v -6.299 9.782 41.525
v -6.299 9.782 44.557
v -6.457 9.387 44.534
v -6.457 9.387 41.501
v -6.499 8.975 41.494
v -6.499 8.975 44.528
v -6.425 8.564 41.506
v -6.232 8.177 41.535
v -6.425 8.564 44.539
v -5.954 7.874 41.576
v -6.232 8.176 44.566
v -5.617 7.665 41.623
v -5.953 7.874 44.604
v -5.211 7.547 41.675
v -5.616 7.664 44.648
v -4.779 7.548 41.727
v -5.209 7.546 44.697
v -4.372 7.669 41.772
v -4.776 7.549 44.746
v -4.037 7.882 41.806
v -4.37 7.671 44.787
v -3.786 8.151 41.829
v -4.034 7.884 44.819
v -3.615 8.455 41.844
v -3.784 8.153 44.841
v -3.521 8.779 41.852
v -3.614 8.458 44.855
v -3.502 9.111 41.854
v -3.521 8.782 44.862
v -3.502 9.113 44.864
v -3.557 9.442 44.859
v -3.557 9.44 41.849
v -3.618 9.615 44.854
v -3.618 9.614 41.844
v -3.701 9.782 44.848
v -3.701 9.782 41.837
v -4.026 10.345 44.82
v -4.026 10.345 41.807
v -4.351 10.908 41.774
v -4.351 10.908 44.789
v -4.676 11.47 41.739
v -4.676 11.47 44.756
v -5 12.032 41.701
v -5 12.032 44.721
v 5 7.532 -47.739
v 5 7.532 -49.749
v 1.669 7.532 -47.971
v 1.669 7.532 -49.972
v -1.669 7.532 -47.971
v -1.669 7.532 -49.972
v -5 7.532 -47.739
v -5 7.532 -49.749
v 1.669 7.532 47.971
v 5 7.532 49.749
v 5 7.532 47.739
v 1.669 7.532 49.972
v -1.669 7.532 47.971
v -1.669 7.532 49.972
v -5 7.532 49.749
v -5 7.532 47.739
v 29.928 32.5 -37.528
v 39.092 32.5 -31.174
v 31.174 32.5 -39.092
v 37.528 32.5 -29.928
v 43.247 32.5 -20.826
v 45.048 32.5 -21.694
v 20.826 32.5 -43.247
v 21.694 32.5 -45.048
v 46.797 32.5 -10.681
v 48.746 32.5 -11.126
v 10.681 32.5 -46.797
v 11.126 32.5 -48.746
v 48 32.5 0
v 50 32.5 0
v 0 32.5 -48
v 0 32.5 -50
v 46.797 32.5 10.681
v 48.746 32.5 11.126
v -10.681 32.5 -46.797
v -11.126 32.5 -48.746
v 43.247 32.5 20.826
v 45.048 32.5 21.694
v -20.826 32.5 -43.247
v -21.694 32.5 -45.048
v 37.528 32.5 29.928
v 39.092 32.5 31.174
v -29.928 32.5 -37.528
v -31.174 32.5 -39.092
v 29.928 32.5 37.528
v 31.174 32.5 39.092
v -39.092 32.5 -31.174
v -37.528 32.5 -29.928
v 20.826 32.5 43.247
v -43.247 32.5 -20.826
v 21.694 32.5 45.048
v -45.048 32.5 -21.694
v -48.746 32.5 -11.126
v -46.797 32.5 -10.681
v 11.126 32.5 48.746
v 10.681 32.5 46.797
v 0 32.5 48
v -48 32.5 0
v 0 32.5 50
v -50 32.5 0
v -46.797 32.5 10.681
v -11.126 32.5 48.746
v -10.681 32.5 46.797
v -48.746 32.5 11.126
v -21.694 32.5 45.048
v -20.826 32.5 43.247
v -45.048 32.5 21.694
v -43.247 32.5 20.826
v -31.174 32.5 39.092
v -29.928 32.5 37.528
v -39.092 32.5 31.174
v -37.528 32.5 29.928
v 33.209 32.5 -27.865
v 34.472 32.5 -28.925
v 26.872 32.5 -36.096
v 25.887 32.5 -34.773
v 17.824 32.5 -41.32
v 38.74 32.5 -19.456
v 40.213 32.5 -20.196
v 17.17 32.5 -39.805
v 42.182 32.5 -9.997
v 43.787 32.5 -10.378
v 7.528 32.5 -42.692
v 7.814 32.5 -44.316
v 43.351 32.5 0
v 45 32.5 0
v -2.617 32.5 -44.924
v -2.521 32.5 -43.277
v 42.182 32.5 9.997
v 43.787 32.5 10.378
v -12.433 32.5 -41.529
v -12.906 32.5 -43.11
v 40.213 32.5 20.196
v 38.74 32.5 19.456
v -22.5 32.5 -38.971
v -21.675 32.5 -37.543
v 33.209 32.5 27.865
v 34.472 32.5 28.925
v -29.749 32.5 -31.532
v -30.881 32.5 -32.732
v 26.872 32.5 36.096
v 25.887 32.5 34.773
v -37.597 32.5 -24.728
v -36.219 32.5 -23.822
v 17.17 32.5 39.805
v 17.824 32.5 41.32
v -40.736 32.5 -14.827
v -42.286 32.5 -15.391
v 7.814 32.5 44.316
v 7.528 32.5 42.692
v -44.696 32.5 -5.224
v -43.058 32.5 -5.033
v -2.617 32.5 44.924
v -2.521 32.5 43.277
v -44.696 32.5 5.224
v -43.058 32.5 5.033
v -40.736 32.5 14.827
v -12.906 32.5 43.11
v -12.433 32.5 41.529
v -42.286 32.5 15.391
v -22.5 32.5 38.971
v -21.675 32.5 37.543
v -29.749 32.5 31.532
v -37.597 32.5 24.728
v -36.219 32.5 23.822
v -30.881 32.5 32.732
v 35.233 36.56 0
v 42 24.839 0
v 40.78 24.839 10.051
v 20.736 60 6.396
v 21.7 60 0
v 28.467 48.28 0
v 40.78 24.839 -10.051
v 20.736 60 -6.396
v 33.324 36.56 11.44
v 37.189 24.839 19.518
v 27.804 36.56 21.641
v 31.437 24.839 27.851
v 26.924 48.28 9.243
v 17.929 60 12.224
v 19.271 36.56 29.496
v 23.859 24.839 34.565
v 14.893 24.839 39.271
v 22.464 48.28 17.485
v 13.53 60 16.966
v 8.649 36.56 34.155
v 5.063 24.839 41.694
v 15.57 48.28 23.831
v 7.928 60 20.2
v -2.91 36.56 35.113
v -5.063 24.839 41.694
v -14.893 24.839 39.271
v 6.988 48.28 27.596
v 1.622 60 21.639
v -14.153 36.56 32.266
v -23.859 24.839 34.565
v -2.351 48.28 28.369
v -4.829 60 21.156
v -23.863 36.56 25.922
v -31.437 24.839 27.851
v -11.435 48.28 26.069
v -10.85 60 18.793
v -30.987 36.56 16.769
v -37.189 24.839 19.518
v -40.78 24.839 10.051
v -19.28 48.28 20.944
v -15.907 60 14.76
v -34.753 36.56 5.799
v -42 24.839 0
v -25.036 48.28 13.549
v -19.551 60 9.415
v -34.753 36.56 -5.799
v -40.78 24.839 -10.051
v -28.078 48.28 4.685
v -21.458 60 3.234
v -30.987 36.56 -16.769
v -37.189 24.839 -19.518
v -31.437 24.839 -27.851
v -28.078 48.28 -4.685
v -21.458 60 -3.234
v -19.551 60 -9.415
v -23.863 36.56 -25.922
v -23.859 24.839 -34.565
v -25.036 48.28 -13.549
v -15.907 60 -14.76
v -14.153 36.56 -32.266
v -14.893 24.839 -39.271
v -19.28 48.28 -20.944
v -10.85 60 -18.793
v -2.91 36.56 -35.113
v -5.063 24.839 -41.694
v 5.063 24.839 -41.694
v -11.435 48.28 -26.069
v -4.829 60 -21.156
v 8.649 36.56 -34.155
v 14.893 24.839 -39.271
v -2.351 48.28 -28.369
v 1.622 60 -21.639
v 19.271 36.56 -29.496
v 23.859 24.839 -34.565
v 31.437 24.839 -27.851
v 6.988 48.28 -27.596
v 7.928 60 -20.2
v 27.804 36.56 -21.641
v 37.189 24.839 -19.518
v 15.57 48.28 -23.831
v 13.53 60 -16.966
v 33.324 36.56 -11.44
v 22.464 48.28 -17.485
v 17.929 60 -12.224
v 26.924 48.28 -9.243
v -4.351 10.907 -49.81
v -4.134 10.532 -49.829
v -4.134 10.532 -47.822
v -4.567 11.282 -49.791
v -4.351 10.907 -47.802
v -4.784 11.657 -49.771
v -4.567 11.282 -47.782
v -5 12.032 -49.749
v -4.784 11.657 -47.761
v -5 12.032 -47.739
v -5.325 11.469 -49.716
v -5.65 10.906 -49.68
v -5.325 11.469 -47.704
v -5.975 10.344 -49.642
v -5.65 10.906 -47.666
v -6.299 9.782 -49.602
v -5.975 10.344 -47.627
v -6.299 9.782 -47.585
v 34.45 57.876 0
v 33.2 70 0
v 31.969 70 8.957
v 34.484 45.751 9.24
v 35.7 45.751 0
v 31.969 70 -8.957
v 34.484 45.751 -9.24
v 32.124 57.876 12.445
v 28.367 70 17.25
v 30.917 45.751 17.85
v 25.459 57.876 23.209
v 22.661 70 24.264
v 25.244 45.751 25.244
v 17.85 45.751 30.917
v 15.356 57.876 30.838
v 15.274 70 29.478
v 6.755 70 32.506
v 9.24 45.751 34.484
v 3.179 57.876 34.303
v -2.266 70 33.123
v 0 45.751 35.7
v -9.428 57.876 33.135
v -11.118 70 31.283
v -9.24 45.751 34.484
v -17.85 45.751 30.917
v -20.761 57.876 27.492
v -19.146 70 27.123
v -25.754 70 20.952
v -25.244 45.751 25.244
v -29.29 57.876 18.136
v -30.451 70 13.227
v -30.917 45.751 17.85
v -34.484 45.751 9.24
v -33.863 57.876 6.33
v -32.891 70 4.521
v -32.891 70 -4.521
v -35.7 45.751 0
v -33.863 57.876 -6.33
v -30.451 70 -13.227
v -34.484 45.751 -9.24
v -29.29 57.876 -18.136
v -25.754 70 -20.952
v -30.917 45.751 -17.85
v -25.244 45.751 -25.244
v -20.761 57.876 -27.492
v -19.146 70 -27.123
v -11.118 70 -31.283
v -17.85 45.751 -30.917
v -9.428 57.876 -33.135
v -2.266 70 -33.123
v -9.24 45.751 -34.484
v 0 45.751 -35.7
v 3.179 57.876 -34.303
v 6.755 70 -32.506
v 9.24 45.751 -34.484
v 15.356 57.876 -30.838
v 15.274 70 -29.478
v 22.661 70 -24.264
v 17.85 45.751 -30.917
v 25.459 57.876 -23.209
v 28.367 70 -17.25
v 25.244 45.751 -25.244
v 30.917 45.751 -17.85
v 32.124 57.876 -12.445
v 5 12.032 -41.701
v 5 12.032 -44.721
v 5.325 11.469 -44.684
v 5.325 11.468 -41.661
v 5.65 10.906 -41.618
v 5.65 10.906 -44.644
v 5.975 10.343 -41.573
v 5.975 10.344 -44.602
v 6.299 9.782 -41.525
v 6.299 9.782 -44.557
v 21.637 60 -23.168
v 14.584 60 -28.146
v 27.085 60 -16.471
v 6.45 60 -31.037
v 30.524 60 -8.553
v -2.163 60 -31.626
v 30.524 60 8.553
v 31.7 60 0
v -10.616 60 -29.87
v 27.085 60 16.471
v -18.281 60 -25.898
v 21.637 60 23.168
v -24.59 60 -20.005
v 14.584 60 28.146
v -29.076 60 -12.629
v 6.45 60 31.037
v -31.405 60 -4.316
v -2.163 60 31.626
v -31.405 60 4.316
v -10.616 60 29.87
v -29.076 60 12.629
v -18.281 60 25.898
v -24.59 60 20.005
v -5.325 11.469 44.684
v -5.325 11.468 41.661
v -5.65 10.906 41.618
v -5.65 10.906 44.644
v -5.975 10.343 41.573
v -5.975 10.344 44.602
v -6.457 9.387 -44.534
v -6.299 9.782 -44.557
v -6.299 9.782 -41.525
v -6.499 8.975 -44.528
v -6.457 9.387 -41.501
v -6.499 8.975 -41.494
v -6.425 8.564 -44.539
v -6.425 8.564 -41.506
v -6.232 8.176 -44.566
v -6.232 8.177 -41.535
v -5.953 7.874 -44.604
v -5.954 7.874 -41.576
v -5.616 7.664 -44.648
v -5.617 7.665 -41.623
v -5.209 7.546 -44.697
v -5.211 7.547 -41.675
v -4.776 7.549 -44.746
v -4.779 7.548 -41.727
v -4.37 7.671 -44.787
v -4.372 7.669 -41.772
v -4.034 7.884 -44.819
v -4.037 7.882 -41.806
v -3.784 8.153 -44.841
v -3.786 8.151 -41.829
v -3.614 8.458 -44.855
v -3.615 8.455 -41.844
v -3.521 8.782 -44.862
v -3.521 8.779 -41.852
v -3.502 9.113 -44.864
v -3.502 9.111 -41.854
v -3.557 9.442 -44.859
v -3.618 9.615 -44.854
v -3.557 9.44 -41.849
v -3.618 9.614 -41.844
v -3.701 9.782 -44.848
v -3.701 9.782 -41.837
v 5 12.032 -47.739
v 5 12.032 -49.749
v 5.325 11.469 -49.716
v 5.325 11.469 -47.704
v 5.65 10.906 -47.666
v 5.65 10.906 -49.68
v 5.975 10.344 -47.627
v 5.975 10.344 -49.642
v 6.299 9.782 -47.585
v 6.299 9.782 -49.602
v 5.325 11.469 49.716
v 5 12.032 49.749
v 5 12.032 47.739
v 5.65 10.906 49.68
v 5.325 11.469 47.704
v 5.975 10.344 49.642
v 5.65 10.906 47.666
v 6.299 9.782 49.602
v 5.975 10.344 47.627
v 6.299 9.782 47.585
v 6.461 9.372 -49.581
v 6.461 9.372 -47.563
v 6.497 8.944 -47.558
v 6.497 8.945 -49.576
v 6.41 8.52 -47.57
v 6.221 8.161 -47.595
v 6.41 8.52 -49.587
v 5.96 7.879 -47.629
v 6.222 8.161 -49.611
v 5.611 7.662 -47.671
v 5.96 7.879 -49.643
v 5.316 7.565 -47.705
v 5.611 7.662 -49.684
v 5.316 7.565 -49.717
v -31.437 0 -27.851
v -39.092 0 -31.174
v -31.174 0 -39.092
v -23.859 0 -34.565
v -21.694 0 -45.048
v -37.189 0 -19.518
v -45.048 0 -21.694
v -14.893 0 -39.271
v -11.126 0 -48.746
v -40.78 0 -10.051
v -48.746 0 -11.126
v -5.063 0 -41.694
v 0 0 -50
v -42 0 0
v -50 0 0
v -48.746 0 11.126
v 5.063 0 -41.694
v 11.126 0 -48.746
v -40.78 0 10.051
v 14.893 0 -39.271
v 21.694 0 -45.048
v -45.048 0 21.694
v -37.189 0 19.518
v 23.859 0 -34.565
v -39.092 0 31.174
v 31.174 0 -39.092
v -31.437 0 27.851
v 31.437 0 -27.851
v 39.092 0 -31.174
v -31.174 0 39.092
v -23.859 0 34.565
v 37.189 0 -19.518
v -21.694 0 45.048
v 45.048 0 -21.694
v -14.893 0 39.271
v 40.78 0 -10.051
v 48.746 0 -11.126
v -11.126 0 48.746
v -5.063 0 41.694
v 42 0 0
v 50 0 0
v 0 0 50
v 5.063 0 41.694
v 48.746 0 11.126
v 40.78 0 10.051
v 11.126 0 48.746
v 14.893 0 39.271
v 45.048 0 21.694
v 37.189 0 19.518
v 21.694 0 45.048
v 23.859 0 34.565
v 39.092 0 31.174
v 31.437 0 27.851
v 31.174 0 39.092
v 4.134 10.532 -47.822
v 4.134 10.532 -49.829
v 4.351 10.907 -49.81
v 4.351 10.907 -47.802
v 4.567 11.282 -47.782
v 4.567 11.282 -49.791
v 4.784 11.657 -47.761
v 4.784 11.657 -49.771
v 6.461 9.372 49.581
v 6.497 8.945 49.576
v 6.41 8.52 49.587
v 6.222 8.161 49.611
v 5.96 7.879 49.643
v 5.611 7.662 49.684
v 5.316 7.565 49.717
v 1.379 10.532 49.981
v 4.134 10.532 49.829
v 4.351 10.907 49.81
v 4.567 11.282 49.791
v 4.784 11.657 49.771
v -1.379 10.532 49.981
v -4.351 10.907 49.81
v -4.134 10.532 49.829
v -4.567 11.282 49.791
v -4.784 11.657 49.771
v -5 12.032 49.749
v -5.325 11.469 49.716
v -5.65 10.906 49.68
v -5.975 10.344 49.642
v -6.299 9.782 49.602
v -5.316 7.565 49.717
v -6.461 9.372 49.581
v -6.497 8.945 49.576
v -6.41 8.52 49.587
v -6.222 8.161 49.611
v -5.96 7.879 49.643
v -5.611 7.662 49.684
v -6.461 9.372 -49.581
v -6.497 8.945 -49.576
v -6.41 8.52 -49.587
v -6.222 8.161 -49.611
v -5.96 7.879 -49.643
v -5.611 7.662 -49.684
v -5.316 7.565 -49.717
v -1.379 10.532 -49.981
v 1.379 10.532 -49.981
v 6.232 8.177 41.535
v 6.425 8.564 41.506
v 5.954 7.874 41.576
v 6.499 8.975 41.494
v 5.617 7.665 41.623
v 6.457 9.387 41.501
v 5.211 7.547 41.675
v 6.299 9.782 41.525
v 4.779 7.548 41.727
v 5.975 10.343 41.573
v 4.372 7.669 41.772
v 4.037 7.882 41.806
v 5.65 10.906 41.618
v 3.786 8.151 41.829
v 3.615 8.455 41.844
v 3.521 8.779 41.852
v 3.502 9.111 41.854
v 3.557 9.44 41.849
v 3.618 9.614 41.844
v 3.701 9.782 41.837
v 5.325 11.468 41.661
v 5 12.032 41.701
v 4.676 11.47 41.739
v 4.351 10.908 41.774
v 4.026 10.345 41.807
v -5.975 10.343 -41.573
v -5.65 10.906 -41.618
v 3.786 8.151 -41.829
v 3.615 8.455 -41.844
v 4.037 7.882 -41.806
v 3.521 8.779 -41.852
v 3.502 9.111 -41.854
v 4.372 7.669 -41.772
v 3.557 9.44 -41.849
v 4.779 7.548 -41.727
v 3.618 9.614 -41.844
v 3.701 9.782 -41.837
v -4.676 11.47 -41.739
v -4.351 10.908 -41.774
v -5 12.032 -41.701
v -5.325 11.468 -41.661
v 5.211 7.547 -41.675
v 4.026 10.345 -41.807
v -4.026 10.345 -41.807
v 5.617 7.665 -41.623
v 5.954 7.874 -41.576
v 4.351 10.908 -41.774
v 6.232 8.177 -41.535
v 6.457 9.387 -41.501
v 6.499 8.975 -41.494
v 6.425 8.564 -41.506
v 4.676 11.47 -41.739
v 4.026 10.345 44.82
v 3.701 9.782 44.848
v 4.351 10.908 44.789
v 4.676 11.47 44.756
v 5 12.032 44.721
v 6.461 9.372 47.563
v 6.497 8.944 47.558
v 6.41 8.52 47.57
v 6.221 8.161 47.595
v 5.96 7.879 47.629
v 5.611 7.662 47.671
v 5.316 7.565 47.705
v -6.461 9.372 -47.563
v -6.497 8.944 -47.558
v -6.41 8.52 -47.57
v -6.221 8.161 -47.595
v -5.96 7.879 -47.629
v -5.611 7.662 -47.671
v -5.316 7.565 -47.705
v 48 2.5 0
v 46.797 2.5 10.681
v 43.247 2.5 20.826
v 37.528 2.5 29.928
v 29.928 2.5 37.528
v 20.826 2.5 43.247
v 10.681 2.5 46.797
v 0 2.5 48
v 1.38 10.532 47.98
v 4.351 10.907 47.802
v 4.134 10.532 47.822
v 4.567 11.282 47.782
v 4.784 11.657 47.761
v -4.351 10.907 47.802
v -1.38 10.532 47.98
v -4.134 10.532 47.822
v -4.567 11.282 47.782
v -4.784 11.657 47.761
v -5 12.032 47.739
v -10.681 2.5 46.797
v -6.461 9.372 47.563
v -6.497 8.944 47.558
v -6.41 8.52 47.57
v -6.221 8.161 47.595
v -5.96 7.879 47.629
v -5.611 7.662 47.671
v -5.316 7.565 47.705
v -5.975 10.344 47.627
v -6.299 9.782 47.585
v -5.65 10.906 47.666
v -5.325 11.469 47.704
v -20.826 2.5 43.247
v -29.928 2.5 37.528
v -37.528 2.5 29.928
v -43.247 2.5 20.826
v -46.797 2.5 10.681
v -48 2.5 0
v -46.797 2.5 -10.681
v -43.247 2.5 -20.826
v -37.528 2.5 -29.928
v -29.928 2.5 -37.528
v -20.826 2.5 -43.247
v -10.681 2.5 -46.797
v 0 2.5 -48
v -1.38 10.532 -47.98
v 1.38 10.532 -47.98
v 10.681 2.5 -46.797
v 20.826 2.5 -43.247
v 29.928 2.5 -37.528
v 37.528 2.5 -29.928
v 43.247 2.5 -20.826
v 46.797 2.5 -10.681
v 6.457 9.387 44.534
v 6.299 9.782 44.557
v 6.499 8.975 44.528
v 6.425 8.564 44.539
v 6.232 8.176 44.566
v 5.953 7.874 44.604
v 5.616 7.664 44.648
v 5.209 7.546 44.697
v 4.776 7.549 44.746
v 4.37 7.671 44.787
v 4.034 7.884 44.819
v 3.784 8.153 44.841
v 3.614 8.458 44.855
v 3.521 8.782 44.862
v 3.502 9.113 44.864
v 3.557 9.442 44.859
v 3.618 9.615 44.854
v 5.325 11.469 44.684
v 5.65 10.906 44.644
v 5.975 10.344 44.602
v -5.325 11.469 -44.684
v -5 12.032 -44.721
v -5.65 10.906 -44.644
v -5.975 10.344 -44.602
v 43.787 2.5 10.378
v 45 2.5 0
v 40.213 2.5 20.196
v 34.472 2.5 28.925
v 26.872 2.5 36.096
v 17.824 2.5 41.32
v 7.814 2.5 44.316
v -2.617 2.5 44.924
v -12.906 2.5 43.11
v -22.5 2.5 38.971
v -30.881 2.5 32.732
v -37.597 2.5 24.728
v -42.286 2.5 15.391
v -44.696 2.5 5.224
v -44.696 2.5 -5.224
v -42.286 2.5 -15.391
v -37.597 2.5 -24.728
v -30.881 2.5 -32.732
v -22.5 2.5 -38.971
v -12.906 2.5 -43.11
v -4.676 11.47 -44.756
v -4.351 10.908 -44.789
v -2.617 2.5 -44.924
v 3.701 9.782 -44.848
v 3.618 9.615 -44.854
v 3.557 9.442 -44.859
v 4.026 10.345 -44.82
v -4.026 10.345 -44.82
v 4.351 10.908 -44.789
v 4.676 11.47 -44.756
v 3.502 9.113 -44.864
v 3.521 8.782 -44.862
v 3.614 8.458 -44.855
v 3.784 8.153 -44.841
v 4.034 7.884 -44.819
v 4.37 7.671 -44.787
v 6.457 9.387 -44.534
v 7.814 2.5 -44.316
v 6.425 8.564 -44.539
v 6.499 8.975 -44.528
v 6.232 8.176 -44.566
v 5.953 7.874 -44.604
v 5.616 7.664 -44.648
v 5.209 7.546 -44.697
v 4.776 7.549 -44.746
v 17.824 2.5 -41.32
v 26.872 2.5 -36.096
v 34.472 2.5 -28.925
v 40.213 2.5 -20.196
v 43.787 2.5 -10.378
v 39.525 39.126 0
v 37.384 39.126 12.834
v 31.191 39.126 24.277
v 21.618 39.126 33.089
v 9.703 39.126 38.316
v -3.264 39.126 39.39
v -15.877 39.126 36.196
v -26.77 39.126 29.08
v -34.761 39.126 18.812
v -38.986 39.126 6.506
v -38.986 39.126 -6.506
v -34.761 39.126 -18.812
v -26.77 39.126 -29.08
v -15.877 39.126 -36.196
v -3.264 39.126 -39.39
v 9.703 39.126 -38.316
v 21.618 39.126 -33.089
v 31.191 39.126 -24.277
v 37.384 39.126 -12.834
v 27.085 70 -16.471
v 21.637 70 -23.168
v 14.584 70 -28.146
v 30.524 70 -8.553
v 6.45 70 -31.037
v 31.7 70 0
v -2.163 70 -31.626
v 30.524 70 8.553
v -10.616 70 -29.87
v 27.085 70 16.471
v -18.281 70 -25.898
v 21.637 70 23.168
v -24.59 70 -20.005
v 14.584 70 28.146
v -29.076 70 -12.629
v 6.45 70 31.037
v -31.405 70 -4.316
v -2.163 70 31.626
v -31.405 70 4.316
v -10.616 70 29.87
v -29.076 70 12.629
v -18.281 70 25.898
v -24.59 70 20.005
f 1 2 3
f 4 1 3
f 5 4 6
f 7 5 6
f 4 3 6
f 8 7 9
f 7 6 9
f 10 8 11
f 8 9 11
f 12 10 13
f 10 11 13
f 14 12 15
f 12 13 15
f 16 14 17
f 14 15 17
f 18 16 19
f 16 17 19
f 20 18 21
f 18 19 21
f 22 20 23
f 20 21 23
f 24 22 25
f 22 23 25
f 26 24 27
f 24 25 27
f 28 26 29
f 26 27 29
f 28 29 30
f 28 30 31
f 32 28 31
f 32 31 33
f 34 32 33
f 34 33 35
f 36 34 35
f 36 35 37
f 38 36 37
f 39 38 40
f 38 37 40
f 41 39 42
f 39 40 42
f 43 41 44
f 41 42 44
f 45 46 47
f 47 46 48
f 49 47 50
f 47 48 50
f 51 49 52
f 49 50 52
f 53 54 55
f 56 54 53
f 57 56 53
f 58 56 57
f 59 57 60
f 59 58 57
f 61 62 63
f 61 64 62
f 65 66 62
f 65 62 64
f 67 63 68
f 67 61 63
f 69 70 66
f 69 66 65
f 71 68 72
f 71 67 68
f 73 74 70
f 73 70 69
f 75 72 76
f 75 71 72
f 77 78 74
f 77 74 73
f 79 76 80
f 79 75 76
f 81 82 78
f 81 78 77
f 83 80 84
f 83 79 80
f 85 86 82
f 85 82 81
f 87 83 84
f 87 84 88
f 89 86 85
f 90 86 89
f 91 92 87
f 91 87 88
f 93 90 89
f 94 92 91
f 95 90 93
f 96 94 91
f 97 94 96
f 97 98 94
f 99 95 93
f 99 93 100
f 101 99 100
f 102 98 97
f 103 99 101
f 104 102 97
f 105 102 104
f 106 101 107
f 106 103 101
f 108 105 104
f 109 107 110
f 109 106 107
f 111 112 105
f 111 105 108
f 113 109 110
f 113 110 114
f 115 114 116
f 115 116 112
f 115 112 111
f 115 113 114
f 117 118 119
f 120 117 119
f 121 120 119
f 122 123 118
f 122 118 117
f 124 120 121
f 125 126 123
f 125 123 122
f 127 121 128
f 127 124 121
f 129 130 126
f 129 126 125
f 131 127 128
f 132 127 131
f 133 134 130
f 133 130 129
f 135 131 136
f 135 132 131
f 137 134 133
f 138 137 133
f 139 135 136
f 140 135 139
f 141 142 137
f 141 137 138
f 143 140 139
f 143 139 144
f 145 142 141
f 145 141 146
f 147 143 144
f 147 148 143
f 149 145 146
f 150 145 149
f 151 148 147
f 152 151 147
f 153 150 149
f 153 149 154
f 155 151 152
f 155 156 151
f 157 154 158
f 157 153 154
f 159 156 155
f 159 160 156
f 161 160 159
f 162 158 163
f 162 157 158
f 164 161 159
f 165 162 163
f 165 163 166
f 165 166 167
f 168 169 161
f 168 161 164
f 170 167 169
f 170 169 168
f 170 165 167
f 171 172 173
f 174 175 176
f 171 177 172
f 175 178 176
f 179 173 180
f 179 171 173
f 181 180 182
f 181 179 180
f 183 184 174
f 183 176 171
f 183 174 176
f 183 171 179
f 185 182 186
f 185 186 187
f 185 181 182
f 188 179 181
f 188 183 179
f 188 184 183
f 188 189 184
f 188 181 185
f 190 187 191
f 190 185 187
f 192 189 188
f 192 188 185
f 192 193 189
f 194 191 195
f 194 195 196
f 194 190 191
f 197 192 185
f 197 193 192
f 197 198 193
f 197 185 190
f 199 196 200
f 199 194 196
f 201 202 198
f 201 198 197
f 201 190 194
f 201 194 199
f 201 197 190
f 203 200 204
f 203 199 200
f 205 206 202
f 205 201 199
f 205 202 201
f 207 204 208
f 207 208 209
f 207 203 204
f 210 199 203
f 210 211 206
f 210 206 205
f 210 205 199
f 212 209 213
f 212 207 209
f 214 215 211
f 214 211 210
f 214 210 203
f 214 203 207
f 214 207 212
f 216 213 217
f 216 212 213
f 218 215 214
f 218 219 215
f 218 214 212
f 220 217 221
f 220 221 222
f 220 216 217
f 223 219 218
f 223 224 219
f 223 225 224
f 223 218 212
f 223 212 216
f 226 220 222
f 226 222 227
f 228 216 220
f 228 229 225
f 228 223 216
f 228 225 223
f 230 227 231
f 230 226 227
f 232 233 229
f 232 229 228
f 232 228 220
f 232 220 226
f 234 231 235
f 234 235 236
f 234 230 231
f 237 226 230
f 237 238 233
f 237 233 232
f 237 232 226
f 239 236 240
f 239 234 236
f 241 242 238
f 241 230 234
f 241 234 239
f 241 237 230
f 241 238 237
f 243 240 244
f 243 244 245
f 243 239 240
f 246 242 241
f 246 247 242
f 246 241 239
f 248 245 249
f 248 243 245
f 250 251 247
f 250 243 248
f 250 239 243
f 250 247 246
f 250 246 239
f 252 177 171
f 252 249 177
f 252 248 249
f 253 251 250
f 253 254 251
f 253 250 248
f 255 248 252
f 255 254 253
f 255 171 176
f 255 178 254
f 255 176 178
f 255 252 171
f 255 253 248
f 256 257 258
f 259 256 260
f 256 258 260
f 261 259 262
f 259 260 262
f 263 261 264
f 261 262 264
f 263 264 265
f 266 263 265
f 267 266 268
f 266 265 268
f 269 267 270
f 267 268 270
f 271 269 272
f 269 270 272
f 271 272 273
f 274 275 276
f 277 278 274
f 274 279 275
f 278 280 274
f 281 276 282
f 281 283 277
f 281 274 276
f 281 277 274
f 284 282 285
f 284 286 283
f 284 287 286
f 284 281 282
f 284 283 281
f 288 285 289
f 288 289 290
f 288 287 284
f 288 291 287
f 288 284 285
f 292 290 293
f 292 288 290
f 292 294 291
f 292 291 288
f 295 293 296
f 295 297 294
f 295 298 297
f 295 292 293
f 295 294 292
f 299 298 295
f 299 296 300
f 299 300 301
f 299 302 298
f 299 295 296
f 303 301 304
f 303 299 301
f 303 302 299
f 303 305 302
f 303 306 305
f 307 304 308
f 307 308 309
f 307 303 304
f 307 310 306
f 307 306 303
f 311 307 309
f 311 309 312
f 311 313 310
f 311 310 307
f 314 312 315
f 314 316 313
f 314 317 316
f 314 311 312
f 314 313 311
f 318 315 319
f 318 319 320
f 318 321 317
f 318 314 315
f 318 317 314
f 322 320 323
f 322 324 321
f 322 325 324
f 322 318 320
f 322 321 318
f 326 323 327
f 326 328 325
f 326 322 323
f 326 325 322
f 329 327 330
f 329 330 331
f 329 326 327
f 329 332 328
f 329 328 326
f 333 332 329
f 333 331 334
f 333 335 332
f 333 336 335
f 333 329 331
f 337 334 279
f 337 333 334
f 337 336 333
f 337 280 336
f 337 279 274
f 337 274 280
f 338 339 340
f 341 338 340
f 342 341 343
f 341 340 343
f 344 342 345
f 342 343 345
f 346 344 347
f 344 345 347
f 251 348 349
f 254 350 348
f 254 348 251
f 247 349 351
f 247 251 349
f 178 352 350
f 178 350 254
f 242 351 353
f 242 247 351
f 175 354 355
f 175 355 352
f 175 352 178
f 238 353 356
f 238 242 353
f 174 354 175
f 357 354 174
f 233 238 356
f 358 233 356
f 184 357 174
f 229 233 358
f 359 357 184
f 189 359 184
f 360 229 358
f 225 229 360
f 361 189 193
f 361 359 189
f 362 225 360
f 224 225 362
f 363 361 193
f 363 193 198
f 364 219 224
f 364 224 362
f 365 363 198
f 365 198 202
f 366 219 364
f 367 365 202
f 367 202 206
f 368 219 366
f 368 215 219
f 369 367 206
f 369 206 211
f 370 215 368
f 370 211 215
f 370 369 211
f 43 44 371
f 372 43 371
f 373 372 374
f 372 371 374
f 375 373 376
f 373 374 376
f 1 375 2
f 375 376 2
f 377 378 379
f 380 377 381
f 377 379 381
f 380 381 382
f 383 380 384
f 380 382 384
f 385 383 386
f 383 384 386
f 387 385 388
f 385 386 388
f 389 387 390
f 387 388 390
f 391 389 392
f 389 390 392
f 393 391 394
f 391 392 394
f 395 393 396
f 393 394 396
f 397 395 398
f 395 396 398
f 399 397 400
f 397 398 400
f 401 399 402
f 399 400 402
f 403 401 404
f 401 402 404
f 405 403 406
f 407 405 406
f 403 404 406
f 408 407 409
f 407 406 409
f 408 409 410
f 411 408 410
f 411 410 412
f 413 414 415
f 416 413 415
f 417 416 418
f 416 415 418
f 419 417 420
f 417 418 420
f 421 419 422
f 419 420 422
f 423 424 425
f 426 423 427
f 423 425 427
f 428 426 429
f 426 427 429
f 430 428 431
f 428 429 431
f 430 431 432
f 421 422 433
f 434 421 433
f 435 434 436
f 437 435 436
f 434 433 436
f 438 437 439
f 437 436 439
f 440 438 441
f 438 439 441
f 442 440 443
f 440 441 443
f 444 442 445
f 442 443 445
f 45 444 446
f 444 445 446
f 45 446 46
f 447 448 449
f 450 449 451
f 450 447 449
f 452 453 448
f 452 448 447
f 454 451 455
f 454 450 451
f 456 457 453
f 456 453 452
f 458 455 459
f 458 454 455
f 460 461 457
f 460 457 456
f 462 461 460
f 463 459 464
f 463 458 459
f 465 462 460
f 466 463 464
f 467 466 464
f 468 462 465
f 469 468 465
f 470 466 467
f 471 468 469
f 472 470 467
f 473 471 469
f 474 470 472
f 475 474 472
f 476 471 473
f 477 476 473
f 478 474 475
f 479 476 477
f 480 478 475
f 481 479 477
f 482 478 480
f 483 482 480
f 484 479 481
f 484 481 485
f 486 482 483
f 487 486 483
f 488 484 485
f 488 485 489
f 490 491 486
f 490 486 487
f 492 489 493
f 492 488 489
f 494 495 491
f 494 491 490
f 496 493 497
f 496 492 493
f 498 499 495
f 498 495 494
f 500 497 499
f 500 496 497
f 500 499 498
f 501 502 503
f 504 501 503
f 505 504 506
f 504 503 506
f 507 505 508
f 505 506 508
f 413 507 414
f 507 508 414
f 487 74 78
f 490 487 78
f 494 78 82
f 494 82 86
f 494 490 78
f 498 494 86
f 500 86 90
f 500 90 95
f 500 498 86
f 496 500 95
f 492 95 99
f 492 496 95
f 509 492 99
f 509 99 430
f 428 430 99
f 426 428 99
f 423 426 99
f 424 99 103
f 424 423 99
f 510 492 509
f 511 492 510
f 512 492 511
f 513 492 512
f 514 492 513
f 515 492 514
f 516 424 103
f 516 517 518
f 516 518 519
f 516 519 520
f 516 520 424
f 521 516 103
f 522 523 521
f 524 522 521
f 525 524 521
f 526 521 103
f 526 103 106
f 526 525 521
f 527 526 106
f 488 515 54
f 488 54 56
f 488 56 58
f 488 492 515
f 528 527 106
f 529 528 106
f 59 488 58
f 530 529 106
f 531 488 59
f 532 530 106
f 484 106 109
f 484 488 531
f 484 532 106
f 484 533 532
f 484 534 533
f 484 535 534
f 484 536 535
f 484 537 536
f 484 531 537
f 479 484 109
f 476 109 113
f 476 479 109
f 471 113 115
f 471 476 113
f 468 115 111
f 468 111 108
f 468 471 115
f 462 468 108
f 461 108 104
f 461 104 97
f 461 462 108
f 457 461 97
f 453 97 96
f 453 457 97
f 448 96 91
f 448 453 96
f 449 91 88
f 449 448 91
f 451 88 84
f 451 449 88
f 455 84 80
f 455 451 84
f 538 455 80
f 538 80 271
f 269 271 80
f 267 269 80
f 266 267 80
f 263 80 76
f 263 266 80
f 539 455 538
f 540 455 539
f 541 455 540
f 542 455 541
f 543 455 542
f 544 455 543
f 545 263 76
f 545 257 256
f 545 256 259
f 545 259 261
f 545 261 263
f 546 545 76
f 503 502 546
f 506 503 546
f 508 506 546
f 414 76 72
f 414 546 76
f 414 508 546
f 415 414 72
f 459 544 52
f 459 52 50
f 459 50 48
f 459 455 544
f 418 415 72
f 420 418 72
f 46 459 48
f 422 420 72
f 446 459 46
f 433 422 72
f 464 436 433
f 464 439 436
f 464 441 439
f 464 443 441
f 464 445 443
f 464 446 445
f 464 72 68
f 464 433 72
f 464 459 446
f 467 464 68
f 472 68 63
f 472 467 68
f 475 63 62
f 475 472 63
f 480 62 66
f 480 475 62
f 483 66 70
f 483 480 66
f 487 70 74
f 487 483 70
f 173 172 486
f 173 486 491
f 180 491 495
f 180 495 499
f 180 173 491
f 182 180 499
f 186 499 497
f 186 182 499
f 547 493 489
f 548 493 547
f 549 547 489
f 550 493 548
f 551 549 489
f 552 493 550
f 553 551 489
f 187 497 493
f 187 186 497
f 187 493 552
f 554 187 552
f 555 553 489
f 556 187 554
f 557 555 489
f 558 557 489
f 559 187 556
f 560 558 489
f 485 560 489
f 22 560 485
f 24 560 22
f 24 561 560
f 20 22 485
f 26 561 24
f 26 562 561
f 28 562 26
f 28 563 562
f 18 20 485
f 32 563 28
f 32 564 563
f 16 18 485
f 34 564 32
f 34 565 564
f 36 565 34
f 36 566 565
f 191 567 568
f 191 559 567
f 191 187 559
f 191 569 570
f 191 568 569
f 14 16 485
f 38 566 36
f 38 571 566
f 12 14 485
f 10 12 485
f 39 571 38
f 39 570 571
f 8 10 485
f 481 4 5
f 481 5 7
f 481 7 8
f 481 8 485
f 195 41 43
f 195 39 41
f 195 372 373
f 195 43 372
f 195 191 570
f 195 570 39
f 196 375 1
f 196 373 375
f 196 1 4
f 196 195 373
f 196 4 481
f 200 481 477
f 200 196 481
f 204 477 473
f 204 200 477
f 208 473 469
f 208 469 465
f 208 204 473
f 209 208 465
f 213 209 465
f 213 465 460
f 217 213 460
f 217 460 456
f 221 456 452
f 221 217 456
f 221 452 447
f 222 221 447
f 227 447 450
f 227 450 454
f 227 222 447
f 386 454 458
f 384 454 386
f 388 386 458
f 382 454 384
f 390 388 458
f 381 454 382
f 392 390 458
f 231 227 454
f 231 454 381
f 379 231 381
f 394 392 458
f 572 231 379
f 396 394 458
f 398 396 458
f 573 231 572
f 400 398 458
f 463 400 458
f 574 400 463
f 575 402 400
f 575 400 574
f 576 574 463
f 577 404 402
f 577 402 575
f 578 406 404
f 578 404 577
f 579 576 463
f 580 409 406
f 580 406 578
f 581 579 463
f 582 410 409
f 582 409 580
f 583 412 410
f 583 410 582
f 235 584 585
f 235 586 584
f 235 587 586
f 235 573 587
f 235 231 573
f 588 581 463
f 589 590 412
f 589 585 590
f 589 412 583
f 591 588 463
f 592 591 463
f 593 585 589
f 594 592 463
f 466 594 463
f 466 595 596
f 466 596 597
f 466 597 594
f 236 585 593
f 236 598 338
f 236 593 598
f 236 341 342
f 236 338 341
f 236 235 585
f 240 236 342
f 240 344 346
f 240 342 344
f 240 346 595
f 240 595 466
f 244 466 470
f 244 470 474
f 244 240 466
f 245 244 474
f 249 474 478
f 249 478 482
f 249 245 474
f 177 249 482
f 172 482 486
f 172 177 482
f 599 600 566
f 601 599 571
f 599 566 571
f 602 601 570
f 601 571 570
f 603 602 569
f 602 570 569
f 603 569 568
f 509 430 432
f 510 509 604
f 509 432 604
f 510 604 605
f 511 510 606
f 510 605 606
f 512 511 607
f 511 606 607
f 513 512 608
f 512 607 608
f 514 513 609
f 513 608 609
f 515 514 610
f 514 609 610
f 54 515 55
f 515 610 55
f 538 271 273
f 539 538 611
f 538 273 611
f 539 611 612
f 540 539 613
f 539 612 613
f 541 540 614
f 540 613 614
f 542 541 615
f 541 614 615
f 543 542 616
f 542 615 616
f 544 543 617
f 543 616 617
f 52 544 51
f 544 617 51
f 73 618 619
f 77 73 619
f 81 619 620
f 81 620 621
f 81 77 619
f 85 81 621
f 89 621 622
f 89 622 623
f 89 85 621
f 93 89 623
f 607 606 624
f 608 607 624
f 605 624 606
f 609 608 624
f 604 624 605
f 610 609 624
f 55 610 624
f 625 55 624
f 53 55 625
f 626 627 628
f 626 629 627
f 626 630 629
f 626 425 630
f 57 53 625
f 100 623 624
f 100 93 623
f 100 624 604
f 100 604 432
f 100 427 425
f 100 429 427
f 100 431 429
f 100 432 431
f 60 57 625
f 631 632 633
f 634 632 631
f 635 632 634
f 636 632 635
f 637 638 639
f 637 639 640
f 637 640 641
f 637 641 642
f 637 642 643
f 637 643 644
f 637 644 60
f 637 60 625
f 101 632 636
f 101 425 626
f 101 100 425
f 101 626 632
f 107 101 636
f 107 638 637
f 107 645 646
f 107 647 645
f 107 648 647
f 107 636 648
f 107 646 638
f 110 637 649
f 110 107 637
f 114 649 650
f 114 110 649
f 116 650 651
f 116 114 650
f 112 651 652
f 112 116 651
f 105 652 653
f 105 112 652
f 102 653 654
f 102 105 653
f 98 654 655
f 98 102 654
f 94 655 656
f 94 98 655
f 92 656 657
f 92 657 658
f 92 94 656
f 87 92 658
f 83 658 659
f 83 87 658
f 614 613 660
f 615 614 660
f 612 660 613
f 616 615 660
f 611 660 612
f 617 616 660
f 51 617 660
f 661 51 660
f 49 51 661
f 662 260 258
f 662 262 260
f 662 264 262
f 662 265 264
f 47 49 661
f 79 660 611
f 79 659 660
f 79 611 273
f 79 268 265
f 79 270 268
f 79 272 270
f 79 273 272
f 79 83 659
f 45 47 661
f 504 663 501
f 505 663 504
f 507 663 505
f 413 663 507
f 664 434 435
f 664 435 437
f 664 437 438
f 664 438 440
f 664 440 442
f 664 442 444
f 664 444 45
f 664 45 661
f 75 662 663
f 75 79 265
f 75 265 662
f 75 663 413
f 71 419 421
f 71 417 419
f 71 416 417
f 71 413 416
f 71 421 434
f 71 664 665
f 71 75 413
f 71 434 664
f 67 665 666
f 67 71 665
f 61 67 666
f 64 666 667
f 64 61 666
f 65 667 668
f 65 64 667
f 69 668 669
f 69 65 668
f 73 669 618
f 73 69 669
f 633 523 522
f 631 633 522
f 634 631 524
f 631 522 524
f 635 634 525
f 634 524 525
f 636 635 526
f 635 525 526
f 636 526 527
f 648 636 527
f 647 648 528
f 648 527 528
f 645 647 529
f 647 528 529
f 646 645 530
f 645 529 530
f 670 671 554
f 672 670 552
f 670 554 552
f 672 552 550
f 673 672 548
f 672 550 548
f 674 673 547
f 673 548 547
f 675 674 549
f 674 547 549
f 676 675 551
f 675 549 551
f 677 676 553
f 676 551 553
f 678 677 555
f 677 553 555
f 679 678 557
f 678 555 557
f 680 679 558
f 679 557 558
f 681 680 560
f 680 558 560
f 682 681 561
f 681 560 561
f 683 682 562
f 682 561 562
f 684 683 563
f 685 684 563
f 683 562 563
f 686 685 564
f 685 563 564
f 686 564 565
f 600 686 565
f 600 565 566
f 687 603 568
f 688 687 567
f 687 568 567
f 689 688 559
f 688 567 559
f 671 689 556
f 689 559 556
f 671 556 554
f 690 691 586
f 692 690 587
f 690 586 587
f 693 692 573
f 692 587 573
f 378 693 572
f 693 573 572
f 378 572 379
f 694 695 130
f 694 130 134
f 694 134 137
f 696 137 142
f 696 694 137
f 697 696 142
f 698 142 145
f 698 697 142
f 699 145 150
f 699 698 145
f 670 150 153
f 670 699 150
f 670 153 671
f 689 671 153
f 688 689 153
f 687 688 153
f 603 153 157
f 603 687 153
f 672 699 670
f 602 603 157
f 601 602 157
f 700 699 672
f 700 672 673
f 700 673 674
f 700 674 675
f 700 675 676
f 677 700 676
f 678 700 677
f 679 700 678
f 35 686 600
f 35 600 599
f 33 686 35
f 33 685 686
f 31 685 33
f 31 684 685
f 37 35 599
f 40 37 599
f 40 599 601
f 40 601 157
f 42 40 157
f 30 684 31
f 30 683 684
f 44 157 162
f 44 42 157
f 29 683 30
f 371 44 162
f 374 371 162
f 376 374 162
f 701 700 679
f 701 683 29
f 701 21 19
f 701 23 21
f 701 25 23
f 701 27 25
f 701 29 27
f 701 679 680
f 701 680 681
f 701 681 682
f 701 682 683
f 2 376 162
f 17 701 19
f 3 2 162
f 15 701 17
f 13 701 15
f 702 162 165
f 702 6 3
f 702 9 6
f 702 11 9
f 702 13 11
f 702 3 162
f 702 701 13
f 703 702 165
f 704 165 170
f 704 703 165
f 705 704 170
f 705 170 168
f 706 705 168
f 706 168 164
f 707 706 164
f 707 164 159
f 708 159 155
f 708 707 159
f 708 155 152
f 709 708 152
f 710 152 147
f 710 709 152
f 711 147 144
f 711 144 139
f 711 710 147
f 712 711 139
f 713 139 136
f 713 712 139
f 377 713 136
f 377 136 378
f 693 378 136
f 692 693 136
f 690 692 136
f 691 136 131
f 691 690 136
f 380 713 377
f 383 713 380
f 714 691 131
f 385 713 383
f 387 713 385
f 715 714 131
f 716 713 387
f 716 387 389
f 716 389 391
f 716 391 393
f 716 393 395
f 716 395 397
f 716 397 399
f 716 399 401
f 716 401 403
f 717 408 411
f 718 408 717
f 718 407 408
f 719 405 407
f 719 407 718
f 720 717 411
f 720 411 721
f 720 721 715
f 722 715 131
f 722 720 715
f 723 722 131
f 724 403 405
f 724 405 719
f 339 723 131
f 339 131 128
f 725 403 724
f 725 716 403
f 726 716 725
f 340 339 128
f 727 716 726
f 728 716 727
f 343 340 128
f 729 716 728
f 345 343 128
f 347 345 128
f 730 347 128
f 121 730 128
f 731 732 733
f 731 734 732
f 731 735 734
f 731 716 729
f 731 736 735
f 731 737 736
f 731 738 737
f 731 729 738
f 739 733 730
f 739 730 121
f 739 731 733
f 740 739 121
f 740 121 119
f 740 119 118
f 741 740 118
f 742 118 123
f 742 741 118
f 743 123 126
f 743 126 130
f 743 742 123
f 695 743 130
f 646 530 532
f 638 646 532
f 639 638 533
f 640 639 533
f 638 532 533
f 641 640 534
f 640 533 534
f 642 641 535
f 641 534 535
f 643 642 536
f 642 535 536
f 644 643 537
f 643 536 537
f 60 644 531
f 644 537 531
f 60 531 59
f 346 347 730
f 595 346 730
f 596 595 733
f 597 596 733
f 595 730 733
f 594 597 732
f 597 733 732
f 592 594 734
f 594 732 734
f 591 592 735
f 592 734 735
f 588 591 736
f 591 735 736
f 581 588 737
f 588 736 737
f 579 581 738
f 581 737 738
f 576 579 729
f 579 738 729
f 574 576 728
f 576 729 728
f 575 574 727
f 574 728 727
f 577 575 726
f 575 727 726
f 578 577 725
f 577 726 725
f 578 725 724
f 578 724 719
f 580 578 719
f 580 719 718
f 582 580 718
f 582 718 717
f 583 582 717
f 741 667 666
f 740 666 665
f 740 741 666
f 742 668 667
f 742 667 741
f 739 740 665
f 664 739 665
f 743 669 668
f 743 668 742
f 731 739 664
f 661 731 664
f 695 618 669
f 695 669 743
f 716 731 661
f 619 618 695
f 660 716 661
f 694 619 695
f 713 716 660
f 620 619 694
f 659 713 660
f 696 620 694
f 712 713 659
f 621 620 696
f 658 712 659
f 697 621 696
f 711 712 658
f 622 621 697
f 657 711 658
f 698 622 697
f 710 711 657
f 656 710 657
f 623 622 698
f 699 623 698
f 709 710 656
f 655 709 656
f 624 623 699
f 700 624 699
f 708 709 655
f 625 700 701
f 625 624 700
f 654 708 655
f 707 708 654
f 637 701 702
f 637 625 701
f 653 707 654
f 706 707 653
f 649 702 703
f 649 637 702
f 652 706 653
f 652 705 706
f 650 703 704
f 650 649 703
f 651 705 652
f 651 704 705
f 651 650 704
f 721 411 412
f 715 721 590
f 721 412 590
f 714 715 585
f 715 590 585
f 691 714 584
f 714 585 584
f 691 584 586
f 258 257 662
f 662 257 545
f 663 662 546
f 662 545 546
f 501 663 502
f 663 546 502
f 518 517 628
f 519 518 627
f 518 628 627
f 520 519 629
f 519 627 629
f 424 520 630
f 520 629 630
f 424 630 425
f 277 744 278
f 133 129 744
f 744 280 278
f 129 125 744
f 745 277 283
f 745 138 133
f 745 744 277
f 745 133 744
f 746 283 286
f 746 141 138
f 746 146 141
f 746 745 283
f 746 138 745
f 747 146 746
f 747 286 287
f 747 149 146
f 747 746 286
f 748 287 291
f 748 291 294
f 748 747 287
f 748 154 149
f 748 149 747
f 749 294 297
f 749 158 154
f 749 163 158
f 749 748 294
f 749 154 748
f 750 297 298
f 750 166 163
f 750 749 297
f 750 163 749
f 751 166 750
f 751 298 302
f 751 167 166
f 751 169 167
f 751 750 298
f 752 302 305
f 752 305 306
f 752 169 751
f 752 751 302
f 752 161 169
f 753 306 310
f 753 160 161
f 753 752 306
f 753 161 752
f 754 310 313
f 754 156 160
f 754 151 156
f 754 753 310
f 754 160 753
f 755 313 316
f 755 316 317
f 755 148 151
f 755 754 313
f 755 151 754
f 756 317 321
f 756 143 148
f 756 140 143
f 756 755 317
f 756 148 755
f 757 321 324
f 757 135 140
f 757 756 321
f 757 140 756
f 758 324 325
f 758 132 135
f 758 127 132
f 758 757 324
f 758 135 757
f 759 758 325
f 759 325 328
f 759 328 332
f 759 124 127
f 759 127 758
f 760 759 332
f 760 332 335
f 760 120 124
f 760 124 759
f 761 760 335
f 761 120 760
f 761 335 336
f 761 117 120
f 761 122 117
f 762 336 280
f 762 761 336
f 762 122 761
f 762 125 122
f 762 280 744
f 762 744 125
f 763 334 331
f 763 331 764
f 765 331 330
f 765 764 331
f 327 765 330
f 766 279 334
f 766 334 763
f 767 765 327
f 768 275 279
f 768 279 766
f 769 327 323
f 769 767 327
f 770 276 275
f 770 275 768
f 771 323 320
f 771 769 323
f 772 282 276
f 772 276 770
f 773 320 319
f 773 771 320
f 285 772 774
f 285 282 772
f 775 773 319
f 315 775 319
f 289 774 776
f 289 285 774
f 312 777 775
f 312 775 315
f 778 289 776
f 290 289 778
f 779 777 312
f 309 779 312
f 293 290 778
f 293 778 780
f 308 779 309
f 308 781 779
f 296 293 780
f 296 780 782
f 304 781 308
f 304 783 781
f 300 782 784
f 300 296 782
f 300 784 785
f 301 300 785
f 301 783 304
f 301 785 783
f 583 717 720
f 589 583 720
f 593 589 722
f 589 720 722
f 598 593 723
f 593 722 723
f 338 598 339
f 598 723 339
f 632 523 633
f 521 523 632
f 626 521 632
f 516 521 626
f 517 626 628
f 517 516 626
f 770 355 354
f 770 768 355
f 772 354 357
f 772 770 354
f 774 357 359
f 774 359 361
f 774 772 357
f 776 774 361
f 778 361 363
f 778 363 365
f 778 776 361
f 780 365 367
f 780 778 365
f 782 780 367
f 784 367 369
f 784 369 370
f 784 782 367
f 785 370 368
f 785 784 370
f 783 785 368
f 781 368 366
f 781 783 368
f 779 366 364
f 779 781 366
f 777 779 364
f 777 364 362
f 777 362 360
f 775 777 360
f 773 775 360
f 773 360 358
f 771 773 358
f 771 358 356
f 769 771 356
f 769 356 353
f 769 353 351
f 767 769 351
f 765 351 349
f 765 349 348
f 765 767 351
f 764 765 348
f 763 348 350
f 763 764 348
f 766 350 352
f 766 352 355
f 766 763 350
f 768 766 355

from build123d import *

# Parameters (mm, degrees)
CUT_EXTRUDE_1798_DEPTH   = 103.8
CUT_EXTRUDE_3_REACH      = 141.642
CUT_EXTRUDE_3_END_RADIUS = 48


with BuildPart() as part:
    # Эскиз1 → Повернуть1 (revolve)
    with BuildSketch(Plane.XY):
        Polygon((21.7, 60), (31.7, 60), (31.7, 70), (33.2, 70), (35.7, 45.751288694), (43.350635095, 32.5), (45, 32.5), (45, 2.5), (48, 2.5), (48, 32.5), (50, 32.5), (50, 0), (42, 0), (42, 24.839368606), align=None)
    revolve(axis=Axis((0, 4, 0), (0, -1, 0)))

    # Эскиз3 → Cut-Extrude 1798 (cut, symmetric)
    with BuildSketch(Plane.XY):
        with BuildLine():
            Line((3.700961894, 9.781798364), (5, 12.031798364))
            Line((5, 12.031798364), (6.299038106, 9.781798364))
            ThreePointArc((6.299038106, 9.781798364), (5, 7.531798364), (3.700961894, 9.781798364))
        make_face()
        with BuildLine():
            Line((-3.700961894, 9.781798364), (-5, 12.031798364))
            Line((-5, 12.031798364), (-6.299038106, 9.781798364))
            ThreePointArc((-6.299038106, 9.781798364), (-5, 7.531798364), (-3.700961894, 9.781798364))
        make_face()
    extrude(amount=CUT_EXTRUDE_1798_DEPTH, both=True, mode=Mode.SUBTRACT)

    # Вырез-Вытянуть3: up to this cylinder (the profile starts outside it)
    cut_extrude_3_end = Plane(origin=(0, 9.031798, 0), z_dir=(0, -1, 0)) * Cylinder(CUT_EXTRUDE_3_END_RADIUS, 380.284, mode=Mode.PRIVATE)
    # Эскиз4 → Вырез-Вытянуть3 (cut, up to the surface)
    with BuildSketch(Plane.XY.offset(-60), mode=Mode.PRIVATE) as cut_extrude_3_sk1:
        with BuildLine():
            Line((-5, 10.531798364), (5, 10.531798364))
            ThreePointArc((5, 10.531798364), (6.5, 9.031798364), (5, 7.531798364))
            Line((5, 7.531798364), (-5, 7.531798364))
            ThreePointArc((-5, 7.531798364), (-6.5, 9.031798364), (-5, 10.531798364))
        make_face()
    cut_extrude_3_tool1 = extrude(cut_extrude_3_sk1.sketch, amount=CUT_EXTRUDE_3_REACH, mode=Mode.PRIVATE) - cut_extrude_3_end
    cut_extrude_3 = cut_extrude_3_tool1.solids().sort_by_distance((0, 9.031798, -60))[0]
    add(cut_extrude_3, mode=Mode.SUBTRACT)

    # Зеркальное отражение1: Вырез-Вытянуть3 across plane
    add(cut_extrude_3.mirror(Plane.XY), mode=Mode.SUBTRACT)


solid = part.part
